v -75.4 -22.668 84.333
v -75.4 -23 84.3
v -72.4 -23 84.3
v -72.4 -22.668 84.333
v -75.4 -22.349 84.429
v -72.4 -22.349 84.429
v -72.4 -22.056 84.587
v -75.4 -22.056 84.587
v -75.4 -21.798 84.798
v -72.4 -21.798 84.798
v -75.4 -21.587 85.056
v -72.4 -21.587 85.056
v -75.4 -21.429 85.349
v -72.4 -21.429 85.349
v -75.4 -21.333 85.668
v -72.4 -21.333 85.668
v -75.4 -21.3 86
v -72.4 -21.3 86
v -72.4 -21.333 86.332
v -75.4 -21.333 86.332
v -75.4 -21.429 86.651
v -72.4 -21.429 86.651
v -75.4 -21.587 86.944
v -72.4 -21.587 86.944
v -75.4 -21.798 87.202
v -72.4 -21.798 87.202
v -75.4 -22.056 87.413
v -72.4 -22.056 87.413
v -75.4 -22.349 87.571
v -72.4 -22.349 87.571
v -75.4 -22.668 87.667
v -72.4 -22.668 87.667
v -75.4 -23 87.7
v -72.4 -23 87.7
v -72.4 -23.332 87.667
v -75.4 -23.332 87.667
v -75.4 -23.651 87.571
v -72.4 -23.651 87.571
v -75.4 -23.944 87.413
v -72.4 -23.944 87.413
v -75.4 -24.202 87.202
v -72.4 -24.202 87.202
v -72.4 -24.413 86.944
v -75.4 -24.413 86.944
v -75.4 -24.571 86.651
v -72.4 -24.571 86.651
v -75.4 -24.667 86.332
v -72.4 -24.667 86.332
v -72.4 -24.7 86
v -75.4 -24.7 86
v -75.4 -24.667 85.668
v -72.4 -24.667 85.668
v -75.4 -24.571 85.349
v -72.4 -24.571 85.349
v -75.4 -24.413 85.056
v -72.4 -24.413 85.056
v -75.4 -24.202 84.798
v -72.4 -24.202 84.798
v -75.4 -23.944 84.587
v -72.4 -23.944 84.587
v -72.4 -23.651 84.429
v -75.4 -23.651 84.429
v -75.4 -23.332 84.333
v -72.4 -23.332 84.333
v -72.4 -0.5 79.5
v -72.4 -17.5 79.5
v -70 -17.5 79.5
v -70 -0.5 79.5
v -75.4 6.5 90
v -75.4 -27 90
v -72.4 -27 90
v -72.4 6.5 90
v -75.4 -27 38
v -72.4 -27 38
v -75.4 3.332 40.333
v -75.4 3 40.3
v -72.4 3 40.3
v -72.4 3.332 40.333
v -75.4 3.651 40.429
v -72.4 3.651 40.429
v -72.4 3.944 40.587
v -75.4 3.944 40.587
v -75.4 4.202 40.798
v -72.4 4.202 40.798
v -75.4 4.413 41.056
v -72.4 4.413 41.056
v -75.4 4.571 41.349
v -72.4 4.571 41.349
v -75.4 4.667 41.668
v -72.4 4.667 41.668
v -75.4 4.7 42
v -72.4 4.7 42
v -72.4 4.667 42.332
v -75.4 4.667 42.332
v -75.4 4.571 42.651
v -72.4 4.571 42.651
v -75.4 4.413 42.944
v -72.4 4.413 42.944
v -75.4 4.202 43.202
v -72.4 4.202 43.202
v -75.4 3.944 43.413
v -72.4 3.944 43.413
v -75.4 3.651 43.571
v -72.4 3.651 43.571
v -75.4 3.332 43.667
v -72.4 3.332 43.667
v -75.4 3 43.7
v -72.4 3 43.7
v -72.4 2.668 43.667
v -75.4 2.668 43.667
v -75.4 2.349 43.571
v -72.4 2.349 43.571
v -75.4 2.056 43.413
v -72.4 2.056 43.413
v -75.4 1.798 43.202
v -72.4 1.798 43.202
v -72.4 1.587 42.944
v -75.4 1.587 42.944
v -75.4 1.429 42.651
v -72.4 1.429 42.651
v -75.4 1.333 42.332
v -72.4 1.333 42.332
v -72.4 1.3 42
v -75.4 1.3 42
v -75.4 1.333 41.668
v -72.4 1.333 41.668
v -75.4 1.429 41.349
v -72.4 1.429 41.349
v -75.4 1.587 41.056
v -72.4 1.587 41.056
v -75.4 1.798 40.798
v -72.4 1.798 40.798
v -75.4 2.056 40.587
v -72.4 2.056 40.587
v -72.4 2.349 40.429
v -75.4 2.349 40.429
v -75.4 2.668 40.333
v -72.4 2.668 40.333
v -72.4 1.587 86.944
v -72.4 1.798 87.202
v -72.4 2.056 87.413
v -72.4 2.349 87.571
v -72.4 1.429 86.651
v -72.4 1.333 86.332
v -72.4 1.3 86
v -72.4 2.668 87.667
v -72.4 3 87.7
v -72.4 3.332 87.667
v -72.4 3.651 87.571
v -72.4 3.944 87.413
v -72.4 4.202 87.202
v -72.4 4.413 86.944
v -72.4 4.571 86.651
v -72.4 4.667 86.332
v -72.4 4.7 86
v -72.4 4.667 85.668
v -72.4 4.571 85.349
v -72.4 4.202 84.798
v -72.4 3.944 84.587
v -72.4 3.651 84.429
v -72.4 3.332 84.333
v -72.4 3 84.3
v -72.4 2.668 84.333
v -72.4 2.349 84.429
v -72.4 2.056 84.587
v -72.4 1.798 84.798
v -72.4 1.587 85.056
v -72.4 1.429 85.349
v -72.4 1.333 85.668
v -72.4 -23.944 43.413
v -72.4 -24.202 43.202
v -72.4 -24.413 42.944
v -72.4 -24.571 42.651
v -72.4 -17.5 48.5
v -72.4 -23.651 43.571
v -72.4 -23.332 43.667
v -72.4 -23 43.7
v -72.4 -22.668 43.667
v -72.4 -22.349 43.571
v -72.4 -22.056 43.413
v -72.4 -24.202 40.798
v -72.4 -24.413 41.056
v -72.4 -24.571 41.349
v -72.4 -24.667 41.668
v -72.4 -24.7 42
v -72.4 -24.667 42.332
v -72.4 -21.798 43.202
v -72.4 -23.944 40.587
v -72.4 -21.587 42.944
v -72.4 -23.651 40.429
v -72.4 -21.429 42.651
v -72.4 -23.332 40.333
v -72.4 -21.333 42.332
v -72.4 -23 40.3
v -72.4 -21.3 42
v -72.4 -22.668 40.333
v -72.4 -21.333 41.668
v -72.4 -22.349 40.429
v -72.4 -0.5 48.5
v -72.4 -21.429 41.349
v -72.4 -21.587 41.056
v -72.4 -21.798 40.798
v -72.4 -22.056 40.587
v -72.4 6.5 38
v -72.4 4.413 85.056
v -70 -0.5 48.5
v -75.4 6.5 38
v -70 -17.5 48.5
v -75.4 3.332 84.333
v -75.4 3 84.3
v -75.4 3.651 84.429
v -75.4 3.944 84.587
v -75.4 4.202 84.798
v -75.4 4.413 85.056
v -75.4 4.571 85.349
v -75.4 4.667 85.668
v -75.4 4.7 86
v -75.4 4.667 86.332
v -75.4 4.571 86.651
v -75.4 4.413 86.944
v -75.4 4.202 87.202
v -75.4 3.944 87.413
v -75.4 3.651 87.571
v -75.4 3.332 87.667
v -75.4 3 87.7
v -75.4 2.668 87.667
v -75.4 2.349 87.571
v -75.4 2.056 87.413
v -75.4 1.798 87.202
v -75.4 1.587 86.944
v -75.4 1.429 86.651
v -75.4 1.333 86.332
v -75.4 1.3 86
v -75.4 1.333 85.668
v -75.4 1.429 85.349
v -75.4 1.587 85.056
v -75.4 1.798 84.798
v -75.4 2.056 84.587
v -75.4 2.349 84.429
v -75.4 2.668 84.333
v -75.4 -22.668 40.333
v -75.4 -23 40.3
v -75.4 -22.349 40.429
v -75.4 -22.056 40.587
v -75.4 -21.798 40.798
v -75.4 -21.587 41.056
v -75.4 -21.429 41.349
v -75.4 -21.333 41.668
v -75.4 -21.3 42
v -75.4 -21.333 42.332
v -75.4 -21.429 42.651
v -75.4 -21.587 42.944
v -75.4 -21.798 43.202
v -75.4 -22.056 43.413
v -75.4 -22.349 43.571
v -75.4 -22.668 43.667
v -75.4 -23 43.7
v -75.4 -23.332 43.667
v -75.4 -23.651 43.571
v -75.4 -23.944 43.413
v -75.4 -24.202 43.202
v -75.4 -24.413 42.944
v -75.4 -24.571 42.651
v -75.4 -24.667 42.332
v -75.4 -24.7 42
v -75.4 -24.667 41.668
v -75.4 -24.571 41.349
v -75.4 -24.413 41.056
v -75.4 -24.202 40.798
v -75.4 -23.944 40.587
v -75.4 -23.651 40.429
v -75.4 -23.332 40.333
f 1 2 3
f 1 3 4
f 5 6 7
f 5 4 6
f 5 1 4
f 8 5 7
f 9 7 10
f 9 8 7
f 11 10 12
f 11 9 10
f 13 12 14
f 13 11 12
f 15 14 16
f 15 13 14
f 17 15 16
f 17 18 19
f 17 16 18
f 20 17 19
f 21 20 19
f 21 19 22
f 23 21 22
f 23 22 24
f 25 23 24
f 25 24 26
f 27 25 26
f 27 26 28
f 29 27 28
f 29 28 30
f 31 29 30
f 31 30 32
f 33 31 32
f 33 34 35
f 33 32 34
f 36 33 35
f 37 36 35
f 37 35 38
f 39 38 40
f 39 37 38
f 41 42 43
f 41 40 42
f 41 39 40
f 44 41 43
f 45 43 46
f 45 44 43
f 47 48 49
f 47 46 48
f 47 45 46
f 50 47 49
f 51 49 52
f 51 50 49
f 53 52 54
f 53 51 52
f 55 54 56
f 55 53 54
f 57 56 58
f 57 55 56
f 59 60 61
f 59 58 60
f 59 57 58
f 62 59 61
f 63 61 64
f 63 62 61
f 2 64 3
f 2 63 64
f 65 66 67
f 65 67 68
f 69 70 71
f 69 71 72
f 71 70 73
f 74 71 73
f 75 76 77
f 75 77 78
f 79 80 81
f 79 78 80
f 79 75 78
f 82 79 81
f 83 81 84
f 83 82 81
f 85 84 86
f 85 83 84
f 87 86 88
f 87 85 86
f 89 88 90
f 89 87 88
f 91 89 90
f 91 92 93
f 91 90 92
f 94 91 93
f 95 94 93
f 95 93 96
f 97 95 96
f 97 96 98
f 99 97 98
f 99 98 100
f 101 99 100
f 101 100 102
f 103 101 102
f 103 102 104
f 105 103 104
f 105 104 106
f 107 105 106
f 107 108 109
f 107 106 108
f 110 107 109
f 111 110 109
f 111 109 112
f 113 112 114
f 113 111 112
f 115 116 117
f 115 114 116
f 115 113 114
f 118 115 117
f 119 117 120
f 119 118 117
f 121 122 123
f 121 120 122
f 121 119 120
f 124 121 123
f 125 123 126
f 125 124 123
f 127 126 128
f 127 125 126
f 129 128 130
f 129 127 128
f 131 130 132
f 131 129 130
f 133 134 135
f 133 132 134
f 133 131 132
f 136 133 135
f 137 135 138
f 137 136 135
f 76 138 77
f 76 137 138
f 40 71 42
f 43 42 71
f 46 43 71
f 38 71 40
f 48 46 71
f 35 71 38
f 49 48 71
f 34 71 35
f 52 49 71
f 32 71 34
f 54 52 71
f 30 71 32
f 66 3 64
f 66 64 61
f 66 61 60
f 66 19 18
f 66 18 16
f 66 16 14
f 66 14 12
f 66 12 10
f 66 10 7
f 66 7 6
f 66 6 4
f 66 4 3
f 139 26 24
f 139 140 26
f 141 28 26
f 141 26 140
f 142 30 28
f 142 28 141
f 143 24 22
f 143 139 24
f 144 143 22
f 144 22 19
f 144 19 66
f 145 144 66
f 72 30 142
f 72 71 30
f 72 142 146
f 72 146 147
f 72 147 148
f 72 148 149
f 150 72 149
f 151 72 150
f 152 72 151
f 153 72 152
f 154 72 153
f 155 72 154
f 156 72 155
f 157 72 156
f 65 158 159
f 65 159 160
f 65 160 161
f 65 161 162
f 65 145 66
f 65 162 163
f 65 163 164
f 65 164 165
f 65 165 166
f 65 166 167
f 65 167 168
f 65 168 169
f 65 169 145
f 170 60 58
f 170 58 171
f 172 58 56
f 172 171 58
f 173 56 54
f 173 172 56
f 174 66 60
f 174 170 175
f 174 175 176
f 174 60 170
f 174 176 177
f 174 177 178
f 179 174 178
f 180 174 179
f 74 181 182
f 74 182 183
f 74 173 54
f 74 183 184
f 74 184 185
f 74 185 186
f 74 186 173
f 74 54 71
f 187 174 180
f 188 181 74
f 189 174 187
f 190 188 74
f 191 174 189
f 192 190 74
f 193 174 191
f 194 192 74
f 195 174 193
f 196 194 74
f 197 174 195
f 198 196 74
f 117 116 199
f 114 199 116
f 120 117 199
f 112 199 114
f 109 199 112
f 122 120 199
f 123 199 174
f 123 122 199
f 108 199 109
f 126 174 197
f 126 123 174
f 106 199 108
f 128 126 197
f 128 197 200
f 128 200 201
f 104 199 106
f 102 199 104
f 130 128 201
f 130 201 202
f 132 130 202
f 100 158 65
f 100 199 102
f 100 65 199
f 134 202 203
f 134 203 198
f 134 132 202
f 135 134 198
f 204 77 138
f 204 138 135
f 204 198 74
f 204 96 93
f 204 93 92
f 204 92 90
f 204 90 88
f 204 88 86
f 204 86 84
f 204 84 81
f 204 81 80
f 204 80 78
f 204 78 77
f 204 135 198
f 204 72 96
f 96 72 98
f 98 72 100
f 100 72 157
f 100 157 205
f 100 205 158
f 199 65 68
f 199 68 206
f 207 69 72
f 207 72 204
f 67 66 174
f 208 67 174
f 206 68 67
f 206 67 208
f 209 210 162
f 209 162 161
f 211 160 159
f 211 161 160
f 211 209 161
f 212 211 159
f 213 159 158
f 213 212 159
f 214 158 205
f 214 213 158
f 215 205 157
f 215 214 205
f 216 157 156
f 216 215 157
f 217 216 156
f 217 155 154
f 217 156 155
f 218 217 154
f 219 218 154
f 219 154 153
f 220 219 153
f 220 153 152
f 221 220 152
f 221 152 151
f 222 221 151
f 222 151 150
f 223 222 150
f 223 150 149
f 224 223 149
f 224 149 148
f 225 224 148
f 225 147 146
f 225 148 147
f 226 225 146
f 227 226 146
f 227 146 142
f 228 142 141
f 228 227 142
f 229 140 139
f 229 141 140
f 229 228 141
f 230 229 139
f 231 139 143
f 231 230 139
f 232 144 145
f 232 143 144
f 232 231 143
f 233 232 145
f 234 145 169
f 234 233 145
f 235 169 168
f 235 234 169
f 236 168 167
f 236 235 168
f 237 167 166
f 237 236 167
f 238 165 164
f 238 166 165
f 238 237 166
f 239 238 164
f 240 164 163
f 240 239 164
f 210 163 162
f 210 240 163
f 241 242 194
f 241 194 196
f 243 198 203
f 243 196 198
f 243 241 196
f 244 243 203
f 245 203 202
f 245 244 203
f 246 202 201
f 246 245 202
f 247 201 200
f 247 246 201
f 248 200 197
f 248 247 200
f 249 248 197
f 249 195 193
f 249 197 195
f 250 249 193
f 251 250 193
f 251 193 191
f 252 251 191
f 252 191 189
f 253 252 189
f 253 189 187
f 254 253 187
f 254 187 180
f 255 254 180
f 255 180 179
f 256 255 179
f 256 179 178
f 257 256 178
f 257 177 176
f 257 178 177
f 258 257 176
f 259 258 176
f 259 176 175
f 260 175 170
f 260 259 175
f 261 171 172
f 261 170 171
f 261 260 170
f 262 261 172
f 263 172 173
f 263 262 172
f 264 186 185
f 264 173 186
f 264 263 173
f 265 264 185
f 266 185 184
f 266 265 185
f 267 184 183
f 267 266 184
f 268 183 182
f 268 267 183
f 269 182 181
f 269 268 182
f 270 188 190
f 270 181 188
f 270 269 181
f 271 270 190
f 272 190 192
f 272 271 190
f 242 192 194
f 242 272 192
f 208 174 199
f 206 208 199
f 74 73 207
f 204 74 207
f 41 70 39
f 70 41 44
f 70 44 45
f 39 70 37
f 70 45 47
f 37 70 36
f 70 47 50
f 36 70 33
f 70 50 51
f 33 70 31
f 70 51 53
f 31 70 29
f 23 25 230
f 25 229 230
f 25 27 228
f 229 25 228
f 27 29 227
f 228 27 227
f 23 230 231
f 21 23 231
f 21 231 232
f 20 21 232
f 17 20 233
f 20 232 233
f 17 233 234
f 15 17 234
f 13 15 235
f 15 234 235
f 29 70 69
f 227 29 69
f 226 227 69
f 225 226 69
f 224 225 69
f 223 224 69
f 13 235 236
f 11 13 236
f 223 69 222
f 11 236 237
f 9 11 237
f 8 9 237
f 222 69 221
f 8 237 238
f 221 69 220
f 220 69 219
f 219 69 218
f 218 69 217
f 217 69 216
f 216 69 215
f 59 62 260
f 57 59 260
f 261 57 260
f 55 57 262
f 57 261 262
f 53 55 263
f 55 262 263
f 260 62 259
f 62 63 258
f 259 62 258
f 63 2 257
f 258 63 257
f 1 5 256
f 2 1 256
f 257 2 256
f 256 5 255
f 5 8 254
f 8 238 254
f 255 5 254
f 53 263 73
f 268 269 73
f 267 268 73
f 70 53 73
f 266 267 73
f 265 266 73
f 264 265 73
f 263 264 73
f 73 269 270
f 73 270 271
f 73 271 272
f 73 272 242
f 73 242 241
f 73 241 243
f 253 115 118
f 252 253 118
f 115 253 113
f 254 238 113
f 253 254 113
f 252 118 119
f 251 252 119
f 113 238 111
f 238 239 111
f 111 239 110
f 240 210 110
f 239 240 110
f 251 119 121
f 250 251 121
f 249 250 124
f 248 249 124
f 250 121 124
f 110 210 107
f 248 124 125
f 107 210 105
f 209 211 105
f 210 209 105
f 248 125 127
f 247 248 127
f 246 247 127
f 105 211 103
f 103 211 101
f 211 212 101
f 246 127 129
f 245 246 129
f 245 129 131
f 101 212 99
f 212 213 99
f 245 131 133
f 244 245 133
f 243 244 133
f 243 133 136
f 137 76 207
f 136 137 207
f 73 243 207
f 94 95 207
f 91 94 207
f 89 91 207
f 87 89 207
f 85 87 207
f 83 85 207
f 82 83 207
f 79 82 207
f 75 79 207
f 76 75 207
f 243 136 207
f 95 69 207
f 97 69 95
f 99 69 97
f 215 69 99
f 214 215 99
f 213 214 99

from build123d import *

# Parameters (mm, degrees)
SKETCH1_W           = 52
SKETCH1_H           = 33.5
COVER_PLATE_DEPTH   = 3
SKETCH2_W           = 31
SKETCH2_H           = 17
LOCATING_PLUG_DEPTH = 2.41
SKETCH3_R           = 1.7
SCREW_HOLES_DEPTH   = 5


with BuildPart() as part:
    # Sketch1 → Cover Plate (new body)
    with BuildSketch(Plane(origin=(-75.4, 0, 0), x_dir=(0, 0, -1), z_dir=(1, 0, 0))):
        with Locations((-64, -10.25)):
            Rectangle(SKETCH1_W, SKETCH1_H)
    extrude(amount=COVER_PLATE_DEPTH)

    # Sketch2 → Locating Plug (add)
    with BuildSketch(Plane(origin=(-72.41, 0, 0), x_dir=(0, 0, -1), z_dir=(1, 0, 0))):
        with Locations((-64, -9)):
            Rectangle(SKETCH2_W, SKETCH2_H)
    extrude(amount=LOCATING_PLUG_DEPTH)

    # Sketch3 → Screw Holes (cut)
    with BuildSketch(Plane(origin=(-76.4, 0, 0), x_dir=(0, 0, -1), z_dir=(1, 0, 0))):
        with Locations((-86, -23)):
            Circle(SKETCH3_R)
        with Locations((-86, 3)):
            Circle(SKETCH3_R)
        with Locations((-42, -23)):
            Circle(SKETCH3_R)
        with Locations((-42, 3)):
            Circle(SKETCH3_R)
    extrude(amount=SCREW_HOLES_DEPTH, mode=Mode.SUBTRACT)


solid = part.part
